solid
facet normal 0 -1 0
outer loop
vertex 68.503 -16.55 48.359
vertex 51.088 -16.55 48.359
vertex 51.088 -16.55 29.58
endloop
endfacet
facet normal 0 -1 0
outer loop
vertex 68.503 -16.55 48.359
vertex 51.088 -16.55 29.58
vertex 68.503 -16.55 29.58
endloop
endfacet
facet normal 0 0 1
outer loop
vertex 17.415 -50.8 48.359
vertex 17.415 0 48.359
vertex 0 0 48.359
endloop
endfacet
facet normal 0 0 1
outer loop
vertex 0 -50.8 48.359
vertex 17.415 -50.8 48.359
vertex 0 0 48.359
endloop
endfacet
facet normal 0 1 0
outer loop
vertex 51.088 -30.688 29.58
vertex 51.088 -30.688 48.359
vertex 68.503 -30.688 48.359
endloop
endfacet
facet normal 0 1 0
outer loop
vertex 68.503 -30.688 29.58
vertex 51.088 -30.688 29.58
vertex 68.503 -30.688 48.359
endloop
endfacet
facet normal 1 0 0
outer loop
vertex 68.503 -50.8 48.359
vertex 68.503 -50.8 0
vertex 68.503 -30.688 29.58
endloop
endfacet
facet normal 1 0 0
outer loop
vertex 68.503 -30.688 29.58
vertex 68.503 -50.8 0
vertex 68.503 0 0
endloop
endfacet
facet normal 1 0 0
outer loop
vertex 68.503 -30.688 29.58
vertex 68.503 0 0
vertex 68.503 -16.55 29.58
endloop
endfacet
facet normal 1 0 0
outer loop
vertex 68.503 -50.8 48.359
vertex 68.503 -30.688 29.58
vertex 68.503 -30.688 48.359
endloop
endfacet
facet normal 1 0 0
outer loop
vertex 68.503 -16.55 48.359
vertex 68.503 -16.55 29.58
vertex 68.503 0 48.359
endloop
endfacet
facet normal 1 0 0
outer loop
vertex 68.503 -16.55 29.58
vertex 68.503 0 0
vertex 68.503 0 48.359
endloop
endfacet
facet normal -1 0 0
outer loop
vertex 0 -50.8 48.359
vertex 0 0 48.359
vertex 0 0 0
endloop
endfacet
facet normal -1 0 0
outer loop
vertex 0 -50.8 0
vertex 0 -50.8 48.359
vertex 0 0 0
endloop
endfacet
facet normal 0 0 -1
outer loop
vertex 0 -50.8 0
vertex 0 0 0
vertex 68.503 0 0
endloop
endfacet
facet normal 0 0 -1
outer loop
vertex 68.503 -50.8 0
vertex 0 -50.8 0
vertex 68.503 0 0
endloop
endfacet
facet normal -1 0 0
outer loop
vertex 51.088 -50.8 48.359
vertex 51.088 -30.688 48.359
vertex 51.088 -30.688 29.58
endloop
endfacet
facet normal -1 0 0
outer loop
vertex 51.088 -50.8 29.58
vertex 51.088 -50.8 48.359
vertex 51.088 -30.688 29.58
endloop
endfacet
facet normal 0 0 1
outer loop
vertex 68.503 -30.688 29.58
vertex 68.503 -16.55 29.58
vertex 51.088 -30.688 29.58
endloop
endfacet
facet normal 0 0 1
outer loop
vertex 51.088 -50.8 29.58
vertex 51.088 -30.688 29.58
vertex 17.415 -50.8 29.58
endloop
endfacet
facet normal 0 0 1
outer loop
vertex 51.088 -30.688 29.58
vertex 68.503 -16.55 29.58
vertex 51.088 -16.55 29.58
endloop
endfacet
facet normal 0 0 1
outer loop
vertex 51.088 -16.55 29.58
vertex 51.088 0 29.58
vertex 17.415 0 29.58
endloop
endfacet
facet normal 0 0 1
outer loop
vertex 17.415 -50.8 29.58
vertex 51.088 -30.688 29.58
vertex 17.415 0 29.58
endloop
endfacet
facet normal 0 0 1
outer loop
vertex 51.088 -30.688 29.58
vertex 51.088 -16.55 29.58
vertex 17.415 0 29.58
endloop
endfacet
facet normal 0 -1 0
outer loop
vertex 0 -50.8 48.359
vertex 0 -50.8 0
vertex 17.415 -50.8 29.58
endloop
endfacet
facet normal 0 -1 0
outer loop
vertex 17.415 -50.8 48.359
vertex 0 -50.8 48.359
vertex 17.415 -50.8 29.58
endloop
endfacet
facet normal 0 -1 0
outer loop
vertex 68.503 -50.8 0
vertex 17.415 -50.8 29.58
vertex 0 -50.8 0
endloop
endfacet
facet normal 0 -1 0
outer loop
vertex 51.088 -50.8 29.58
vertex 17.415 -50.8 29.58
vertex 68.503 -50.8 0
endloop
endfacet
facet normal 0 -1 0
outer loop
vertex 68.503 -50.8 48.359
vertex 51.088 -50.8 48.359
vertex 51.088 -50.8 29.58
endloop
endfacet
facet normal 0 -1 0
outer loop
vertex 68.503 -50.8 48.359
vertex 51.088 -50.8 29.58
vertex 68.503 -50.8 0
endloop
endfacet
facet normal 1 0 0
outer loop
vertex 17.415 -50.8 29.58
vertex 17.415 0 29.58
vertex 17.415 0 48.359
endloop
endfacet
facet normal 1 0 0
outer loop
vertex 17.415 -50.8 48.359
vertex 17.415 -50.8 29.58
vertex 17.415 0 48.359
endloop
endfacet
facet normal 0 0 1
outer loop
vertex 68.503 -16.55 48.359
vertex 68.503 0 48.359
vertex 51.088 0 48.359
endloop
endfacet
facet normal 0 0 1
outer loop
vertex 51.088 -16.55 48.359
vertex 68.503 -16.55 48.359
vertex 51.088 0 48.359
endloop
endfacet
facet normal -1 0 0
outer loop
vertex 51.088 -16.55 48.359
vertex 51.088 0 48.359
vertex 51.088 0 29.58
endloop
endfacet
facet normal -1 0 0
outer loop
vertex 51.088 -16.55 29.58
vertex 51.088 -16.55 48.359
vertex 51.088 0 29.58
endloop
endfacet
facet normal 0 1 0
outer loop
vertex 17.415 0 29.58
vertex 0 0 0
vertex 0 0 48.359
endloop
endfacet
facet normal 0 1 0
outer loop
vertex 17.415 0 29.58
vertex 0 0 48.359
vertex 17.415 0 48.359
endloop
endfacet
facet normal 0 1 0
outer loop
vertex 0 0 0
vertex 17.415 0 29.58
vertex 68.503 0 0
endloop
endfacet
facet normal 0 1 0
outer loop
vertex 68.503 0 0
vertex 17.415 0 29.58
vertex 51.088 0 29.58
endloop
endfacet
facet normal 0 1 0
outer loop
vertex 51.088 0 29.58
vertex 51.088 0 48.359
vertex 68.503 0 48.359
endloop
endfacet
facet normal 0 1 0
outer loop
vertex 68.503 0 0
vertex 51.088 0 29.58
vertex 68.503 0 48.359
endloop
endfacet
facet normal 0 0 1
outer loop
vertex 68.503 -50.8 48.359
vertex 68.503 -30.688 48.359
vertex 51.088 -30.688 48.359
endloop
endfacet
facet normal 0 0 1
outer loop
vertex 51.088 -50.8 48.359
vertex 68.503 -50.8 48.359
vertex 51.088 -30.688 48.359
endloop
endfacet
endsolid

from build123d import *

# Parameters (mm, degrees)
F1_DEPTH = 50.8
F2_W     = 17.4146303907
F2_H     = 14.1386073083
F3_DEPTH = 18.779527396


with BuildPart() as f1:
    # F0 (on Front) → F1 (new body)
    with BuildSketch(Plane.XZ):
        Polygon((0, 48.3591668308), (0, 0), (68.5028927401, 0), (68.5028927401, 48.3591668308), (51.0882623494, 48.3591668308), (51.0882623494, 29.5796394348), (17.4146303907, 29.5796394348), (17.4146303907, 48.3591668308), align=None)
    extrude(amount=F1_DEPTH)

    # F2 (on face) → F3 (cut, through all)
    with BuildSketch(Plane.XY.offset(48.3591668308)):
        with Locations((59.7955775447, -23.6191870645)):
            Rectangle(F2_W, F2_H)
    extrude(amount=-F3_DEPTH, mode=Mode.SUBTRACT)


solid = f1.part
